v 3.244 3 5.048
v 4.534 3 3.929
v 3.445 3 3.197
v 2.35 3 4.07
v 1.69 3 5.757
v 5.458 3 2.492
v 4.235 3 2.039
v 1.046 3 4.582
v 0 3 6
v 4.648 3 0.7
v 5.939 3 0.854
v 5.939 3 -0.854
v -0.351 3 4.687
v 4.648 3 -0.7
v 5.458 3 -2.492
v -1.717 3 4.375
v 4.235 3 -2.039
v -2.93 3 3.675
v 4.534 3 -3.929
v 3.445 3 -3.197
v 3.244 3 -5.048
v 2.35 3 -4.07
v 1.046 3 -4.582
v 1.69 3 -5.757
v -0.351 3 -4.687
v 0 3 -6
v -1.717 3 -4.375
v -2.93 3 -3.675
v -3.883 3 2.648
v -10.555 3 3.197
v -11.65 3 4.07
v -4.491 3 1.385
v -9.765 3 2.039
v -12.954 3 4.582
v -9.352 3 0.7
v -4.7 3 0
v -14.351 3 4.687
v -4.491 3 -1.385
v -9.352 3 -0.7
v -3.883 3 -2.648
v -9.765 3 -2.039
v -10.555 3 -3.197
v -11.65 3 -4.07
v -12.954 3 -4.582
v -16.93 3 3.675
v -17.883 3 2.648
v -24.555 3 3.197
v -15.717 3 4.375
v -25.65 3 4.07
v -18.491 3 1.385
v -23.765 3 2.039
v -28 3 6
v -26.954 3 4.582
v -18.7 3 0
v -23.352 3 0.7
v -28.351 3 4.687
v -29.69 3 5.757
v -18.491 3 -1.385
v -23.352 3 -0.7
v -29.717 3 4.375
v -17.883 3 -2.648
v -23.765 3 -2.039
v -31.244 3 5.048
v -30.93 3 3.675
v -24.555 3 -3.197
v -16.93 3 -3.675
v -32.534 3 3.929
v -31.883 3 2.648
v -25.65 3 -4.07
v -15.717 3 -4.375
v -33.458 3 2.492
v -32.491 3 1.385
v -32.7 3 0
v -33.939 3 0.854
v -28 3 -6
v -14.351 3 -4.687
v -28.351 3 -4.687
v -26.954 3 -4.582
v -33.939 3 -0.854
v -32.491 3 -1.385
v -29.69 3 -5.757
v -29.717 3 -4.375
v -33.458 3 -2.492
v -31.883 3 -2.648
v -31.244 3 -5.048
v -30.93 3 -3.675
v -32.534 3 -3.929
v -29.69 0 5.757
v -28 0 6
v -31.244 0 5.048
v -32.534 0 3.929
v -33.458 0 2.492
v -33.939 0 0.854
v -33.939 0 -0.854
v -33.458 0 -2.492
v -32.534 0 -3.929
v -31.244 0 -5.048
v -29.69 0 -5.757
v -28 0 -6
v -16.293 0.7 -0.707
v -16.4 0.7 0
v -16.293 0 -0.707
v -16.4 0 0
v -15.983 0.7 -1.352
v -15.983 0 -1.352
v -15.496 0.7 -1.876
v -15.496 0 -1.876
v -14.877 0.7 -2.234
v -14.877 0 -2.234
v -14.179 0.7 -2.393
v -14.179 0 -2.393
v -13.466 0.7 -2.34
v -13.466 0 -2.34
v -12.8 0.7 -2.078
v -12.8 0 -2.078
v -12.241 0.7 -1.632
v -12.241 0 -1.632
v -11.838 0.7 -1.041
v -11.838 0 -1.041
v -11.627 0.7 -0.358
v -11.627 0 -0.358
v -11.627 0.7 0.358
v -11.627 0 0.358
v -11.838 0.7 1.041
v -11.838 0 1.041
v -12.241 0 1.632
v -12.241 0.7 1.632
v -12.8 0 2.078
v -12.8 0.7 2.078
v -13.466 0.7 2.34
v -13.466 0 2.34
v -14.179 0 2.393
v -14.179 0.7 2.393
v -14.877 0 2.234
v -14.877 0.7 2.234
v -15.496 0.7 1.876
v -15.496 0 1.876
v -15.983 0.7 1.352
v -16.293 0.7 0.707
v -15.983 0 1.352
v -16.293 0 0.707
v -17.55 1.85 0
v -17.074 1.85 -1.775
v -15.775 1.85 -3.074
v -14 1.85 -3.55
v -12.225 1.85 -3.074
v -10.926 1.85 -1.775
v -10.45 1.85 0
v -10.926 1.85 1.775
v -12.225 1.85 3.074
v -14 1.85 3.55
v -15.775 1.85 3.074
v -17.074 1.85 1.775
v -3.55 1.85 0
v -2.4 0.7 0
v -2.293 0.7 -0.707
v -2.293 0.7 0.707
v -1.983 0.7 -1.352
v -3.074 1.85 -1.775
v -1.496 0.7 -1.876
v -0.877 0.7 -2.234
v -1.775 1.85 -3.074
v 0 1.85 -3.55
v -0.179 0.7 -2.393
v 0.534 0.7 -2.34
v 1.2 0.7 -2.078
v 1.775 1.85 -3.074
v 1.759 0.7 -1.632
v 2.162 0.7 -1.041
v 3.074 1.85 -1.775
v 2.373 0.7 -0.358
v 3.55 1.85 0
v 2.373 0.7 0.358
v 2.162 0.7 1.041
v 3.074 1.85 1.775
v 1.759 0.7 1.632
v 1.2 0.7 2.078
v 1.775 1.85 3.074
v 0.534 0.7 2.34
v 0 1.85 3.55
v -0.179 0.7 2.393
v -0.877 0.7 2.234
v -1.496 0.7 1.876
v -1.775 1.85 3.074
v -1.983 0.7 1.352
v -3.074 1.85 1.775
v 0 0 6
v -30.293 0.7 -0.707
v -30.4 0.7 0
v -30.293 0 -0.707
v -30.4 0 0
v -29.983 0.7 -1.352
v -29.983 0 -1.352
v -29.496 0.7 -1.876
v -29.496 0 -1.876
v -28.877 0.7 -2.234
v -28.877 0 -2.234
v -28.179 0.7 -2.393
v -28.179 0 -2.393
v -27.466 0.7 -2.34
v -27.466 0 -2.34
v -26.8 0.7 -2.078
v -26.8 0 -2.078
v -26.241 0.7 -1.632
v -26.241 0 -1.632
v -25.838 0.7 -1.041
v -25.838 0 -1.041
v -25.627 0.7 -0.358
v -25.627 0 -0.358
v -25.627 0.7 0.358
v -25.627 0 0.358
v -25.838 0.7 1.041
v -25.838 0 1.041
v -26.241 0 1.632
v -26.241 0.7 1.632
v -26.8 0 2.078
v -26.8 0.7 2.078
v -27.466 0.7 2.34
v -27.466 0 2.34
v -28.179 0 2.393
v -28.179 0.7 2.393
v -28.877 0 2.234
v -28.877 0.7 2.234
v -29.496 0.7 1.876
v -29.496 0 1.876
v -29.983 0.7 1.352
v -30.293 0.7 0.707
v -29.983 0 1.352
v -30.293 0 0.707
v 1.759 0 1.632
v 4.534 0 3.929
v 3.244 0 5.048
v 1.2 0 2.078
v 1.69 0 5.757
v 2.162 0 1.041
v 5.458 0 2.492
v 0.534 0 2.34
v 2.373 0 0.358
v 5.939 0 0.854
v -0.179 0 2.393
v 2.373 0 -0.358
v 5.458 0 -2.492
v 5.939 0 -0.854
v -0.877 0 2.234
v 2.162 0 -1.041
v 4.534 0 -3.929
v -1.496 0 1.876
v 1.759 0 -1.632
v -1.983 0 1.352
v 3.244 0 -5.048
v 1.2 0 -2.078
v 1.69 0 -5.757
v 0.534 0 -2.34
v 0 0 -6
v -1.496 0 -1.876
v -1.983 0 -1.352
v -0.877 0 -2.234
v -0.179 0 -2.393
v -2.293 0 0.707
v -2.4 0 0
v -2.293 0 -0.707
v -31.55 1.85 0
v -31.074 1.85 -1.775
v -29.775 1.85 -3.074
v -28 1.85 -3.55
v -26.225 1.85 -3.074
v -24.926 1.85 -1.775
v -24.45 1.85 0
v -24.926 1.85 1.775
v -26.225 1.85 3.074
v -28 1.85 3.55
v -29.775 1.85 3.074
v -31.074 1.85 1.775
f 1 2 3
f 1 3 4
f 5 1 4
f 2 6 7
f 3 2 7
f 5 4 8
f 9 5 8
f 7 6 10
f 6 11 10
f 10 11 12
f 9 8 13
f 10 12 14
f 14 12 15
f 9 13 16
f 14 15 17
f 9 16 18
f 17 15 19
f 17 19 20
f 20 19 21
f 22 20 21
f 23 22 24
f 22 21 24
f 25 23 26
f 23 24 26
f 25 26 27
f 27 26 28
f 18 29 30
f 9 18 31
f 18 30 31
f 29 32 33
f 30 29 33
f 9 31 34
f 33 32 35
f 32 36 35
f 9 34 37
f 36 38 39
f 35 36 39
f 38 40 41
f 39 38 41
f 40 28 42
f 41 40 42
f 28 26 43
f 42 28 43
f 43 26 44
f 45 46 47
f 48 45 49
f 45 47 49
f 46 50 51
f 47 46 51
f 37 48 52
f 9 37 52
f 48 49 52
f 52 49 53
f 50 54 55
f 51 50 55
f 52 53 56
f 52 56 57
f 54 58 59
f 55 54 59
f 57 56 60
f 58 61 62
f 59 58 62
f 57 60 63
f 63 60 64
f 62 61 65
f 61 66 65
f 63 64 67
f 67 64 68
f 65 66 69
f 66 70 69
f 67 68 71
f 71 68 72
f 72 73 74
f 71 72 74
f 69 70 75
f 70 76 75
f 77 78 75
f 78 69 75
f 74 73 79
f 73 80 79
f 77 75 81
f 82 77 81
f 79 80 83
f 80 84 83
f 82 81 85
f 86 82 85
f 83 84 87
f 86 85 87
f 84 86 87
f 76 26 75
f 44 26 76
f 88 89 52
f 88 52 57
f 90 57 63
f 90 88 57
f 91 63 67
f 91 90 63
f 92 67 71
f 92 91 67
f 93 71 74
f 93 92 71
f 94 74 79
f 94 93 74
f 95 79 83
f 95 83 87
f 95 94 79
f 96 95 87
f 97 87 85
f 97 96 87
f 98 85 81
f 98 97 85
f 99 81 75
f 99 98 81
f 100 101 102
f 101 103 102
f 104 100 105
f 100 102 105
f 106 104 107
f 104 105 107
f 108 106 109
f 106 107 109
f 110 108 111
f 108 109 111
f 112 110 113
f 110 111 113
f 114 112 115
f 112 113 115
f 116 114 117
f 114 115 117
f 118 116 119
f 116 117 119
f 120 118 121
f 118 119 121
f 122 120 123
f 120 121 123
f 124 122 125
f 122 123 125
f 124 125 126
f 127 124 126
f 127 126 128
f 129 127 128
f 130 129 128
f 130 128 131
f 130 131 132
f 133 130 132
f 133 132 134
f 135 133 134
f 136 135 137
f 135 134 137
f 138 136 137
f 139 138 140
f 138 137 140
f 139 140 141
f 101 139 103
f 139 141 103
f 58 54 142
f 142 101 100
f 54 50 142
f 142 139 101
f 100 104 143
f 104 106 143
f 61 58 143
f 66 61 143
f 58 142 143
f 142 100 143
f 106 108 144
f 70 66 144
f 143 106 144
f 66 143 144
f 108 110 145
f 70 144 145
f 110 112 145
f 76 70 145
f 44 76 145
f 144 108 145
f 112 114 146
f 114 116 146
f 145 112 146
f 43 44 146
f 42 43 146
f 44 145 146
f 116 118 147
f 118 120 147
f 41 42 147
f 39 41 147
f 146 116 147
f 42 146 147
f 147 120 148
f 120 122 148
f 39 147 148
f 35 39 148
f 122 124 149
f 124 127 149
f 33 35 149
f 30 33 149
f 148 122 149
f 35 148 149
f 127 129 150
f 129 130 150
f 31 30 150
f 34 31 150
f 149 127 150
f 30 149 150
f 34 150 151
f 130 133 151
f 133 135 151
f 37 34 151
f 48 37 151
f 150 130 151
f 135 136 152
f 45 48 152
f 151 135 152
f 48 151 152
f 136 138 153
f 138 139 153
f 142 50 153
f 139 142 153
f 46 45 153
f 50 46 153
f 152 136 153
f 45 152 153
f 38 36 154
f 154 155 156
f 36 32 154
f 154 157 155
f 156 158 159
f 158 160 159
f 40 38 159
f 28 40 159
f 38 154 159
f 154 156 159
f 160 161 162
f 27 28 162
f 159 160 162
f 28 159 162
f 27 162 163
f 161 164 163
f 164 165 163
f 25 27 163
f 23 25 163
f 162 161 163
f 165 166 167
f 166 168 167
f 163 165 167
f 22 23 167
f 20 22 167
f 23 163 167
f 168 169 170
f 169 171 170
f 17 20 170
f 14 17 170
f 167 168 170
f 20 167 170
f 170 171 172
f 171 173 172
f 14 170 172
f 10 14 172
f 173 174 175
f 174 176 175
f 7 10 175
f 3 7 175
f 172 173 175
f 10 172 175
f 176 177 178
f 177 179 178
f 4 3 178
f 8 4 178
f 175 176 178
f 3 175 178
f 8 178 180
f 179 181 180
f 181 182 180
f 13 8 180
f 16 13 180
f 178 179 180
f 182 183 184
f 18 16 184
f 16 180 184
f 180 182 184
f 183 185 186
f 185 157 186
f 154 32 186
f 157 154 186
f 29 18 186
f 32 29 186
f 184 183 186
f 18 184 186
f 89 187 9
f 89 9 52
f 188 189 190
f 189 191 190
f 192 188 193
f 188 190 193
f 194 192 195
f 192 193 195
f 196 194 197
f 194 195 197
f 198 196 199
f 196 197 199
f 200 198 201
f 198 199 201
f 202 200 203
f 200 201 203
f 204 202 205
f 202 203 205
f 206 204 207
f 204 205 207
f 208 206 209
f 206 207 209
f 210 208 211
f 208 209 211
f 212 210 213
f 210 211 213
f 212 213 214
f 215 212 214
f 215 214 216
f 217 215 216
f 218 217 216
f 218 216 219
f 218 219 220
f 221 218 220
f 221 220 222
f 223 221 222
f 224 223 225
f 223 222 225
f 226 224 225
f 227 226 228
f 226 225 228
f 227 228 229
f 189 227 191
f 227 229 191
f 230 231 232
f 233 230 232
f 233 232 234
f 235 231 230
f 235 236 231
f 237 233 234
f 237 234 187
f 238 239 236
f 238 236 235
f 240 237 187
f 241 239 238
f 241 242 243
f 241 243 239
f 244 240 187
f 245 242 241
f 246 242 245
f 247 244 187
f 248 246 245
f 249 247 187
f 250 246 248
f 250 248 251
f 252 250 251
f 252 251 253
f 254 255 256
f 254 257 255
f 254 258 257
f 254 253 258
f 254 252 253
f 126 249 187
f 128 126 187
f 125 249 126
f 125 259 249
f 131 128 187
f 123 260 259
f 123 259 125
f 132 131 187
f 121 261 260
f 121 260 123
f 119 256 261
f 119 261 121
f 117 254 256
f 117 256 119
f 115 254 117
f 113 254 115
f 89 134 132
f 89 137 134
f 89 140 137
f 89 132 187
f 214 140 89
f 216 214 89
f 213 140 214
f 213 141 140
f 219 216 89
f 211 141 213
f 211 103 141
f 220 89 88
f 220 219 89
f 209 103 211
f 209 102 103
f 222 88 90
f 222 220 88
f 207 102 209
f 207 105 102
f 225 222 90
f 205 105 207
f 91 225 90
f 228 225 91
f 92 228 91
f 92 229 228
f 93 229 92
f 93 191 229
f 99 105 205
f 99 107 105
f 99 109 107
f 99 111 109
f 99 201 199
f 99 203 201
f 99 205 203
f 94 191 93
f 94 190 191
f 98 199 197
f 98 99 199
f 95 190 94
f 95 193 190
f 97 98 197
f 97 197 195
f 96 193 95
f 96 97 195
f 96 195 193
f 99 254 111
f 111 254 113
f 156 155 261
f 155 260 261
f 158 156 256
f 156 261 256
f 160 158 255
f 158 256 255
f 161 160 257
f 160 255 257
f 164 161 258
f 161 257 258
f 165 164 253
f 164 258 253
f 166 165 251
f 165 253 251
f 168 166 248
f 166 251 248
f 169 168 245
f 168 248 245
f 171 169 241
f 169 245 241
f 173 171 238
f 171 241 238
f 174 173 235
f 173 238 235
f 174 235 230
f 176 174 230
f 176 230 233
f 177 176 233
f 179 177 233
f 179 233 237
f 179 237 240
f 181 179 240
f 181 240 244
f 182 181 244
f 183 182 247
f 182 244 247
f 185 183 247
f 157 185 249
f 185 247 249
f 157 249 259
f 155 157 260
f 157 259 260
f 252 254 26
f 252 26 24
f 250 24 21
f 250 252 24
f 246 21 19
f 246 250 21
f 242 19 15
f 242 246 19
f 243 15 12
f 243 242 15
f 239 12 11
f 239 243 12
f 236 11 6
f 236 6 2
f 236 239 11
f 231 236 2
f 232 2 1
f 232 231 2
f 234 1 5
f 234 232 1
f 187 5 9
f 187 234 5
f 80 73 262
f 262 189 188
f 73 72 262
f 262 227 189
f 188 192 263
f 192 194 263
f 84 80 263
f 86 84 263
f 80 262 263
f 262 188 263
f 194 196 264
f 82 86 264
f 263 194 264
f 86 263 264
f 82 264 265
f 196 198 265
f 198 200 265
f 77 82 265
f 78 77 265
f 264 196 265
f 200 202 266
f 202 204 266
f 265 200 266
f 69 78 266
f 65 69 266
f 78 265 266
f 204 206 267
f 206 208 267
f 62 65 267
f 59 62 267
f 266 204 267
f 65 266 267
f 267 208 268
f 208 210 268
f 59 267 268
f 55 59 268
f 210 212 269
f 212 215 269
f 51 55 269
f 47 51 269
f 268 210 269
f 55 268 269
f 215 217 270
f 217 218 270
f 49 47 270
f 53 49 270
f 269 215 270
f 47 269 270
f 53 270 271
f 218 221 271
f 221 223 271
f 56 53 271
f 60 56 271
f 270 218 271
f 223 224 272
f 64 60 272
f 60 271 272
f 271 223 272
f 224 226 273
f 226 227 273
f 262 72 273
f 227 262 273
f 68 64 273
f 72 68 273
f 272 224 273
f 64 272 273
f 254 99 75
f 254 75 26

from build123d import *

# Parameters (mm, degrees)
SKETCH1_R                                       = 2
BOSS_EXTRUDE2_DEPTH                             = 3
CSK_FOR_M4_FLAT_HEAD_MACHINE_SCREW1_D           = 4.8
CSK_FOR_M4_FLAT_HEAD_MACHINE_SCREW1_DEPTH       = 22.23
CSK_FOR_M4_FLAT_HEAD_MACHINE_SCREW1_CSINK_D     = 9.4
CSK_FOR_M4_FLAT_HEAD_MACHINE_SCREW1_CSINK_ANGLE = 90
CSK_FOR_M4_FLAT_HEAD_MACHINE_SCREW1_TIP         = 1.442065486
CSK_FOR_M4_FLAT_HEAD_MACHINE_SCREW2_D           = 4.8
CSK_FOR_M4_FLAT_HEAD_MACHINE_SCREW2_DEPTH       = 22.23
CSK_FOR_M4_FLAT_HEAD_MACHINE_SCREW2_CSINK_D     = 9.4
CSK_FOR_M4_FLAT_HEAD_MACHINE_SCREW2_CSINK_ANGLE = 90
CSK_FOR_M4_FLAT_HEAD_MACHINE_SCREW2_TIP         = 1.442065486


with BuildPart() as part:
    # Sketch1 → Boss-Extrude2 (new body)
    with BuildSketch(Plane(origin=(0, 0, 0), x_dir=(1, 0, 0), z_dir=(0, 1, 0))):
        with BuildLine():
            Line((-28, 6), (0, 6))
            ThreePointArc((0, 6), (6, 0), (0, -6))
            Line((0, -6), (-28, -6))
            ThreePointArc((-28, -6), (-34, 0), (-28, 6))
        make_face()
        with Locations((-28, 0)):
            Circle(SKETCH1_R, mode=Mode.SUBTRACT)
        with Locations((-14, 0)):
            Circle(SKETCH1_R, mode=Mode.SUBTRACT)
        Circle(SKETCH1_R, mode=Mode.SUBTRACT)
    extrude(amount=BOSS_EXTRUDE2_DEPTH)

    # CSK for M4 Flat Head Machine Screw1
    with Locations(Plane(origin=(0, 3, 0), x_dir=(1, 0, 0), z_dir=(0, 1, 0))):
        with Locations((-14, 0)):
            CounterSinkHole(CSK_FOR_M4_FLAT_HEAD_MACHINE_SCREW1_D / 2, CSK_FOR_M4_FLAT_HEAD_MACHINE_SCREW1_CSINK_D / 2, depth=CSK_FOR_M4_FLAT_HEAD_MACHINE_SCREW1_DEPTH, counter_sink_angle=CSK_FOR_M4_FLAT_HEAD_MACHINE_SCREW1_CSINK_ANGLE)
            with Locations((0, 0, -(CSK_FOR_M4_FLAT_HEAD_MACHINE_SCREW1_DEPTH + CSK_FOR_M4_FLAT_HEAD_MACHINE_SCREW1_TIP / 2))):  # 118° drill point
                Cone(0, CSK_FOR_M4_FLAT_HEAD_MACHINE_SCREW1_D / 2, CSK_FOR_M4_FLAT_HEAD_MACHINE_SCREW1_TIP, mode=Mode.SUBTRACT)

    # CSK for M4 Flat Head Machine Screw2
    with Locations(Plane(origin=(0, 3, 0), x_dir=(1, 0, 0), z_dir=(0, 1, 0))):
        with Locations((-28, 0), (0, 0)):
            CounterSinkHole(CSK_FOR_M4_FLAT_HEAD_MACHINE_SCREW2_D / 2, CSK_FOR_M4_FLAT_HEAD_MACHINE_SCREW2_CSINK_D / 2, depth=CSK_FOR_M4_FLAT_HEAD_MACHINE_SCREW2_DEPTH, counter_sink_angle=CSK_FOR_M4_FLAT_HEAD_MACHINE_SCREW2_CSINK_ANGLE)
            with Locations((0, 0, -(CSK_FOR_M4_FLAT_HEAD_MACHINE_SCREW2_DEPTH + CSK_FOR_M4_FLAT_HEAD_MACHINE_SCREW2_TIP / 2))):  # 118° drill point
                Cone(0, CSK_FOR_M4_FLAT_HEAD_MACHINE_SCREW2_D / 2, CSK_FOR_M4_FLAT_HEAD_MACHINE_SCREW2_TIP, mode=Mode.SUBTRACT)


solid = part.part
